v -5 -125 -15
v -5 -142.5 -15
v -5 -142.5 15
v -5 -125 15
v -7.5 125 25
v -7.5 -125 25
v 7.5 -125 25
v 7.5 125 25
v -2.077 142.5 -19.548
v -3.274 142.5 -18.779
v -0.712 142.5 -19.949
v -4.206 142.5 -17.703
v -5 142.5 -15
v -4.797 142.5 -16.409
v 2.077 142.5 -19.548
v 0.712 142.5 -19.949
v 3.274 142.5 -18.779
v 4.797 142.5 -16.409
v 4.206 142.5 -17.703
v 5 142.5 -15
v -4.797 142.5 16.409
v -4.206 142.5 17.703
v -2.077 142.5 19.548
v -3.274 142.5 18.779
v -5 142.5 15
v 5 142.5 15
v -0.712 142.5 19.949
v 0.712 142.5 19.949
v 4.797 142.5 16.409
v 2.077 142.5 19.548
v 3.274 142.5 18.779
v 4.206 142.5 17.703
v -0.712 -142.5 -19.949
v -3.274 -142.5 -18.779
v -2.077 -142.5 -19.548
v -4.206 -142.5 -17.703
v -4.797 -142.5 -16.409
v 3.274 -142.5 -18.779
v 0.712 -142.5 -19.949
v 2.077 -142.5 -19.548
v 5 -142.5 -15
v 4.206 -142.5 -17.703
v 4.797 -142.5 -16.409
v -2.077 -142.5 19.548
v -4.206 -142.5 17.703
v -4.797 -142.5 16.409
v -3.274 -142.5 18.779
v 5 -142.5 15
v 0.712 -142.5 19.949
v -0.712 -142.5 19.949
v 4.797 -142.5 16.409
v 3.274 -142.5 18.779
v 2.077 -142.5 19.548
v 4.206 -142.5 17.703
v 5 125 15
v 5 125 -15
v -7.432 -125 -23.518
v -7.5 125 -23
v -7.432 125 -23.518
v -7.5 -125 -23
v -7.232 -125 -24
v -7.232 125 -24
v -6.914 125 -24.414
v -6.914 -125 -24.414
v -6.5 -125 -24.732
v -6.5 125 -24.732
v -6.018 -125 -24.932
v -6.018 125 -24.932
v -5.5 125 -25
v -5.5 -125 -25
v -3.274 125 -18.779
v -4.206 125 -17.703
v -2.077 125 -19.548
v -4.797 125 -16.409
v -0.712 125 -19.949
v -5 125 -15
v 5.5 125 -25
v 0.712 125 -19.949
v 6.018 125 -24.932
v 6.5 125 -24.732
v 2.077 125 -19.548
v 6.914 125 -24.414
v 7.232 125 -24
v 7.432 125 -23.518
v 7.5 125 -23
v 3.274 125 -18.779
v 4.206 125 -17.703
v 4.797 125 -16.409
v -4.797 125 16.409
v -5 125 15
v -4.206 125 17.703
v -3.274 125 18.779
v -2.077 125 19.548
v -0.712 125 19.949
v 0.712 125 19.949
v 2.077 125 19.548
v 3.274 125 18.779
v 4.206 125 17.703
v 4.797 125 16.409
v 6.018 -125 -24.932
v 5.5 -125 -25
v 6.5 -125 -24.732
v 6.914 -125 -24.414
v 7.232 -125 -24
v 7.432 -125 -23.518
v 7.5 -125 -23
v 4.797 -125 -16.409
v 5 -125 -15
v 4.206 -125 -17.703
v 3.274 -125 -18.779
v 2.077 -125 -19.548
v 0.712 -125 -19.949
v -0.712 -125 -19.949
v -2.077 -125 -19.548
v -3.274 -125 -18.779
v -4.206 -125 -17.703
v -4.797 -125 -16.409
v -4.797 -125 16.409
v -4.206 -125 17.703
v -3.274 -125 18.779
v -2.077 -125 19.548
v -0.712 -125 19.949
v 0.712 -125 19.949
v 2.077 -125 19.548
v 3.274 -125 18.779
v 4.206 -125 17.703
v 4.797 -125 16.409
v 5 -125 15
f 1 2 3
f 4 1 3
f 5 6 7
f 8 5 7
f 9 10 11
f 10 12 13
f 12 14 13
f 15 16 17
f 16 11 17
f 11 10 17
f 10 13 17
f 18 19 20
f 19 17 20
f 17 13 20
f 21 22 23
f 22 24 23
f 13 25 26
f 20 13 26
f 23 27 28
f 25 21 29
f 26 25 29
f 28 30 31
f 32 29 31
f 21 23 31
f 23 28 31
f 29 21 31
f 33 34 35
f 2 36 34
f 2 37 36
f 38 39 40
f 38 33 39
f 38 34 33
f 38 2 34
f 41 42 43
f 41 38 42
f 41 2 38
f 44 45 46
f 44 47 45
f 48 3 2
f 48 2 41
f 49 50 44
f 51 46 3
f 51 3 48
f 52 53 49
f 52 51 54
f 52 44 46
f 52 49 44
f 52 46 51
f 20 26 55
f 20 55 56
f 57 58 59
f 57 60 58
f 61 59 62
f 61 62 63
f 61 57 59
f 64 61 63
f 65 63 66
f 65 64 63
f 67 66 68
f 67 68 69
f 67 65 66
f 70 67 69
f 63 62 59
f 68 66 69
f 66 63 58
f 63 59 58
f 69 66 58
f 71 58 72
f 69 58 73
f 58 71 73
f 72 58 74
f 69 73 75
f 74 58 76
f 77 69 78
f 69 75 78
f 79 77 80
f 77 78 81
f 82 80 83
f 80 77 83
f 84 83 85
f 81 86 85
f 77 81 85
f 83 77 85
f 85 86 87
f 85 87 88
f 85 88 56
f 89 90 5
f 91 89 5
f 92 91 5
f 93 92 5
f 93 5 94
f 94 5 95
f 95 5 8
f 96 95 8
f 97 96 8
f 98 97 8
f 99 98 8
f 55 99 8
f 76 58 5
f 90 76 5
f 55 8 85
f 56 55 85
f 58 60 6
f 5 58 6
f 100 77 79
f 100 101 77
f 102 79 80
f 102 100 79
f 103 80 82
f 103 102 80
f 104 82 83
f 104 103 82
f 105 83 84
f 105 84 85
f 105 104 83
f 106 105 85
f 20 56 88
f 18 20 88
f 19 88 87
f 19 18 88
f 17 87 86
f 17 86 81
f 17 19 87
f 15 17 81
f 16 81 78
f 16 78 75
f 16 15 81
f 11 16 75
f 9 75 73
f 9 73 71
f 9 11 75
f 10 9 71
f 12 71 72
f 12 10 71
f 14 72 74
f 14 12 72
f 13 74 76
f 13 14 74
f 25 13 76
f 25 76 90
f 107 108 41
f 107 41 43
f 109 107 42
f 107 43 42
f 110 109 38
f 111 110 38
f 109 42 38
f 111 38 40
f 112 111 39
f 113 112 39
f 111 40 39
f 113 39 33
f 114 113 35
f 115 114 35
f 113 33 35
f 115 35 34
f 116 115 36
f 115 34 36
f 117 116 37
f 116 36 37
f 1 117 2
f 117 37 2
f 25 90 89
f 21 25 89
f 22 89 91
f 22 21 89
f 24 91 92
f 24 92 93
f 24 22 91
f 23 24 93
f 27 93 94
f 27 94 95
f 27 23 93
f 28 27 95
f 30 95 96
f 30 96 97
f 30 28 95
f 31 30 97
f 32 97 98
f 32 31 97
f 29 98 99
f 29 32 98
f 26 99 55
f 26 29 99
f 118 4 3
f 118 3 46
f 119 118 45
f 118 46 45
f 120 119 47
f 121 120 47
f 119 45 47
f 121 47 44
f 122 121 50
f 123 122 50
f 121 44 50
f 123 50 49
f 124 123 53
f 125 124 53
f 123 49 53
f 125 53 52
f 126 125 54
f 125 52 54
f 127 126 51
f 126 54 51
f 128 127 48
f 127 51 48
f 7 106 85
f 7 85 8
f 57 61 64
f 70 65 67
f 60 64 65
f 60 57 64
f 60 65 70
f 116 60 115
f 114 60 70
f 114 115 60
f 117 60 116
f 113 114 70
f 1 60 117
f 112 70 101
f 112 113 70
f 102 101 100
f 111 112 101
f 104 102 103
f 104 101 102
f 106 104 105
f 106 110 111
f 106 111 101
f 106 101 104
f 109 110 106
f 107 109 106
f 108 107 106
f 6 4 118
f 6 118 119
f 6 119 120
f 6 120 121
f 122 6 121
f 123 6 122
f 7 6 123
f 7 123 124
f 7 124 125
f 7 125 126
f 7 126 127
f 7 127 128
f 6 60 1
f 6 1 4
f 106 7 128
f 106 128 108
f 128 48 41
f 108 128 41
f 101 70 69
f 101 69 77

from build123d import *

# Parameters (mm, degrees)
F0_W          = 15
F0_H          = 50
F1_DEPTH      = 142.5
F1_DEPTH_BACK = 142.5
F2_W          = 15
F2_H          = 50
F3_DEPTH      = 17.5
F4_R          = 2


# Not quite as in the source:
# - a pattern or mirror of a feature is missing from the dataset's text; its kind, count and spacing are read off the source's solid


with BuildPart() as f1:
    # F0 (on Front) → F1 (new body, two sides)
    with BuildSketch(Plane.XZ) as f1_sk:
        Rectangle(F0_W, F0_H)
    extrude(amount=F1_DEPTH)
    extrude(f1_sk.sketch, amount=-F1_DEPTH_BACK)

    # F2 (on face) → F3 (cut)
    with BuildSketch(Plane.XZ.offset(142.5)):
        Rectangle(F2_W, F2_H)
        with BuildLine():
            ThreePointArc((5, -15), (0, -20), (-5, -15))
            Line((-5, -15), (-5, 15))
            ThreePointArc((-5, 15), (0, 20), (5, 15))
            Line((5, 15), (5, -15))
        make_face(mode=Mode.SUBTRACT)
    f3 = extrude(amount=-F3_DEPTH, mode=Mode.SUBTRACT)

    # F3_copies: F3 across plane
    add(f3.mirror(Plane.ZX), mode=Mode.SUBTRACT)

    # F4
    f4_edges = [f1.edges().sort_by_distance(p)[0] for p in [
        (7.5, 0, -25),
        (-7.5, 0, -25),
    ]]
    fillet(f4_edges, radius=F4_R)


solid = f1.part
